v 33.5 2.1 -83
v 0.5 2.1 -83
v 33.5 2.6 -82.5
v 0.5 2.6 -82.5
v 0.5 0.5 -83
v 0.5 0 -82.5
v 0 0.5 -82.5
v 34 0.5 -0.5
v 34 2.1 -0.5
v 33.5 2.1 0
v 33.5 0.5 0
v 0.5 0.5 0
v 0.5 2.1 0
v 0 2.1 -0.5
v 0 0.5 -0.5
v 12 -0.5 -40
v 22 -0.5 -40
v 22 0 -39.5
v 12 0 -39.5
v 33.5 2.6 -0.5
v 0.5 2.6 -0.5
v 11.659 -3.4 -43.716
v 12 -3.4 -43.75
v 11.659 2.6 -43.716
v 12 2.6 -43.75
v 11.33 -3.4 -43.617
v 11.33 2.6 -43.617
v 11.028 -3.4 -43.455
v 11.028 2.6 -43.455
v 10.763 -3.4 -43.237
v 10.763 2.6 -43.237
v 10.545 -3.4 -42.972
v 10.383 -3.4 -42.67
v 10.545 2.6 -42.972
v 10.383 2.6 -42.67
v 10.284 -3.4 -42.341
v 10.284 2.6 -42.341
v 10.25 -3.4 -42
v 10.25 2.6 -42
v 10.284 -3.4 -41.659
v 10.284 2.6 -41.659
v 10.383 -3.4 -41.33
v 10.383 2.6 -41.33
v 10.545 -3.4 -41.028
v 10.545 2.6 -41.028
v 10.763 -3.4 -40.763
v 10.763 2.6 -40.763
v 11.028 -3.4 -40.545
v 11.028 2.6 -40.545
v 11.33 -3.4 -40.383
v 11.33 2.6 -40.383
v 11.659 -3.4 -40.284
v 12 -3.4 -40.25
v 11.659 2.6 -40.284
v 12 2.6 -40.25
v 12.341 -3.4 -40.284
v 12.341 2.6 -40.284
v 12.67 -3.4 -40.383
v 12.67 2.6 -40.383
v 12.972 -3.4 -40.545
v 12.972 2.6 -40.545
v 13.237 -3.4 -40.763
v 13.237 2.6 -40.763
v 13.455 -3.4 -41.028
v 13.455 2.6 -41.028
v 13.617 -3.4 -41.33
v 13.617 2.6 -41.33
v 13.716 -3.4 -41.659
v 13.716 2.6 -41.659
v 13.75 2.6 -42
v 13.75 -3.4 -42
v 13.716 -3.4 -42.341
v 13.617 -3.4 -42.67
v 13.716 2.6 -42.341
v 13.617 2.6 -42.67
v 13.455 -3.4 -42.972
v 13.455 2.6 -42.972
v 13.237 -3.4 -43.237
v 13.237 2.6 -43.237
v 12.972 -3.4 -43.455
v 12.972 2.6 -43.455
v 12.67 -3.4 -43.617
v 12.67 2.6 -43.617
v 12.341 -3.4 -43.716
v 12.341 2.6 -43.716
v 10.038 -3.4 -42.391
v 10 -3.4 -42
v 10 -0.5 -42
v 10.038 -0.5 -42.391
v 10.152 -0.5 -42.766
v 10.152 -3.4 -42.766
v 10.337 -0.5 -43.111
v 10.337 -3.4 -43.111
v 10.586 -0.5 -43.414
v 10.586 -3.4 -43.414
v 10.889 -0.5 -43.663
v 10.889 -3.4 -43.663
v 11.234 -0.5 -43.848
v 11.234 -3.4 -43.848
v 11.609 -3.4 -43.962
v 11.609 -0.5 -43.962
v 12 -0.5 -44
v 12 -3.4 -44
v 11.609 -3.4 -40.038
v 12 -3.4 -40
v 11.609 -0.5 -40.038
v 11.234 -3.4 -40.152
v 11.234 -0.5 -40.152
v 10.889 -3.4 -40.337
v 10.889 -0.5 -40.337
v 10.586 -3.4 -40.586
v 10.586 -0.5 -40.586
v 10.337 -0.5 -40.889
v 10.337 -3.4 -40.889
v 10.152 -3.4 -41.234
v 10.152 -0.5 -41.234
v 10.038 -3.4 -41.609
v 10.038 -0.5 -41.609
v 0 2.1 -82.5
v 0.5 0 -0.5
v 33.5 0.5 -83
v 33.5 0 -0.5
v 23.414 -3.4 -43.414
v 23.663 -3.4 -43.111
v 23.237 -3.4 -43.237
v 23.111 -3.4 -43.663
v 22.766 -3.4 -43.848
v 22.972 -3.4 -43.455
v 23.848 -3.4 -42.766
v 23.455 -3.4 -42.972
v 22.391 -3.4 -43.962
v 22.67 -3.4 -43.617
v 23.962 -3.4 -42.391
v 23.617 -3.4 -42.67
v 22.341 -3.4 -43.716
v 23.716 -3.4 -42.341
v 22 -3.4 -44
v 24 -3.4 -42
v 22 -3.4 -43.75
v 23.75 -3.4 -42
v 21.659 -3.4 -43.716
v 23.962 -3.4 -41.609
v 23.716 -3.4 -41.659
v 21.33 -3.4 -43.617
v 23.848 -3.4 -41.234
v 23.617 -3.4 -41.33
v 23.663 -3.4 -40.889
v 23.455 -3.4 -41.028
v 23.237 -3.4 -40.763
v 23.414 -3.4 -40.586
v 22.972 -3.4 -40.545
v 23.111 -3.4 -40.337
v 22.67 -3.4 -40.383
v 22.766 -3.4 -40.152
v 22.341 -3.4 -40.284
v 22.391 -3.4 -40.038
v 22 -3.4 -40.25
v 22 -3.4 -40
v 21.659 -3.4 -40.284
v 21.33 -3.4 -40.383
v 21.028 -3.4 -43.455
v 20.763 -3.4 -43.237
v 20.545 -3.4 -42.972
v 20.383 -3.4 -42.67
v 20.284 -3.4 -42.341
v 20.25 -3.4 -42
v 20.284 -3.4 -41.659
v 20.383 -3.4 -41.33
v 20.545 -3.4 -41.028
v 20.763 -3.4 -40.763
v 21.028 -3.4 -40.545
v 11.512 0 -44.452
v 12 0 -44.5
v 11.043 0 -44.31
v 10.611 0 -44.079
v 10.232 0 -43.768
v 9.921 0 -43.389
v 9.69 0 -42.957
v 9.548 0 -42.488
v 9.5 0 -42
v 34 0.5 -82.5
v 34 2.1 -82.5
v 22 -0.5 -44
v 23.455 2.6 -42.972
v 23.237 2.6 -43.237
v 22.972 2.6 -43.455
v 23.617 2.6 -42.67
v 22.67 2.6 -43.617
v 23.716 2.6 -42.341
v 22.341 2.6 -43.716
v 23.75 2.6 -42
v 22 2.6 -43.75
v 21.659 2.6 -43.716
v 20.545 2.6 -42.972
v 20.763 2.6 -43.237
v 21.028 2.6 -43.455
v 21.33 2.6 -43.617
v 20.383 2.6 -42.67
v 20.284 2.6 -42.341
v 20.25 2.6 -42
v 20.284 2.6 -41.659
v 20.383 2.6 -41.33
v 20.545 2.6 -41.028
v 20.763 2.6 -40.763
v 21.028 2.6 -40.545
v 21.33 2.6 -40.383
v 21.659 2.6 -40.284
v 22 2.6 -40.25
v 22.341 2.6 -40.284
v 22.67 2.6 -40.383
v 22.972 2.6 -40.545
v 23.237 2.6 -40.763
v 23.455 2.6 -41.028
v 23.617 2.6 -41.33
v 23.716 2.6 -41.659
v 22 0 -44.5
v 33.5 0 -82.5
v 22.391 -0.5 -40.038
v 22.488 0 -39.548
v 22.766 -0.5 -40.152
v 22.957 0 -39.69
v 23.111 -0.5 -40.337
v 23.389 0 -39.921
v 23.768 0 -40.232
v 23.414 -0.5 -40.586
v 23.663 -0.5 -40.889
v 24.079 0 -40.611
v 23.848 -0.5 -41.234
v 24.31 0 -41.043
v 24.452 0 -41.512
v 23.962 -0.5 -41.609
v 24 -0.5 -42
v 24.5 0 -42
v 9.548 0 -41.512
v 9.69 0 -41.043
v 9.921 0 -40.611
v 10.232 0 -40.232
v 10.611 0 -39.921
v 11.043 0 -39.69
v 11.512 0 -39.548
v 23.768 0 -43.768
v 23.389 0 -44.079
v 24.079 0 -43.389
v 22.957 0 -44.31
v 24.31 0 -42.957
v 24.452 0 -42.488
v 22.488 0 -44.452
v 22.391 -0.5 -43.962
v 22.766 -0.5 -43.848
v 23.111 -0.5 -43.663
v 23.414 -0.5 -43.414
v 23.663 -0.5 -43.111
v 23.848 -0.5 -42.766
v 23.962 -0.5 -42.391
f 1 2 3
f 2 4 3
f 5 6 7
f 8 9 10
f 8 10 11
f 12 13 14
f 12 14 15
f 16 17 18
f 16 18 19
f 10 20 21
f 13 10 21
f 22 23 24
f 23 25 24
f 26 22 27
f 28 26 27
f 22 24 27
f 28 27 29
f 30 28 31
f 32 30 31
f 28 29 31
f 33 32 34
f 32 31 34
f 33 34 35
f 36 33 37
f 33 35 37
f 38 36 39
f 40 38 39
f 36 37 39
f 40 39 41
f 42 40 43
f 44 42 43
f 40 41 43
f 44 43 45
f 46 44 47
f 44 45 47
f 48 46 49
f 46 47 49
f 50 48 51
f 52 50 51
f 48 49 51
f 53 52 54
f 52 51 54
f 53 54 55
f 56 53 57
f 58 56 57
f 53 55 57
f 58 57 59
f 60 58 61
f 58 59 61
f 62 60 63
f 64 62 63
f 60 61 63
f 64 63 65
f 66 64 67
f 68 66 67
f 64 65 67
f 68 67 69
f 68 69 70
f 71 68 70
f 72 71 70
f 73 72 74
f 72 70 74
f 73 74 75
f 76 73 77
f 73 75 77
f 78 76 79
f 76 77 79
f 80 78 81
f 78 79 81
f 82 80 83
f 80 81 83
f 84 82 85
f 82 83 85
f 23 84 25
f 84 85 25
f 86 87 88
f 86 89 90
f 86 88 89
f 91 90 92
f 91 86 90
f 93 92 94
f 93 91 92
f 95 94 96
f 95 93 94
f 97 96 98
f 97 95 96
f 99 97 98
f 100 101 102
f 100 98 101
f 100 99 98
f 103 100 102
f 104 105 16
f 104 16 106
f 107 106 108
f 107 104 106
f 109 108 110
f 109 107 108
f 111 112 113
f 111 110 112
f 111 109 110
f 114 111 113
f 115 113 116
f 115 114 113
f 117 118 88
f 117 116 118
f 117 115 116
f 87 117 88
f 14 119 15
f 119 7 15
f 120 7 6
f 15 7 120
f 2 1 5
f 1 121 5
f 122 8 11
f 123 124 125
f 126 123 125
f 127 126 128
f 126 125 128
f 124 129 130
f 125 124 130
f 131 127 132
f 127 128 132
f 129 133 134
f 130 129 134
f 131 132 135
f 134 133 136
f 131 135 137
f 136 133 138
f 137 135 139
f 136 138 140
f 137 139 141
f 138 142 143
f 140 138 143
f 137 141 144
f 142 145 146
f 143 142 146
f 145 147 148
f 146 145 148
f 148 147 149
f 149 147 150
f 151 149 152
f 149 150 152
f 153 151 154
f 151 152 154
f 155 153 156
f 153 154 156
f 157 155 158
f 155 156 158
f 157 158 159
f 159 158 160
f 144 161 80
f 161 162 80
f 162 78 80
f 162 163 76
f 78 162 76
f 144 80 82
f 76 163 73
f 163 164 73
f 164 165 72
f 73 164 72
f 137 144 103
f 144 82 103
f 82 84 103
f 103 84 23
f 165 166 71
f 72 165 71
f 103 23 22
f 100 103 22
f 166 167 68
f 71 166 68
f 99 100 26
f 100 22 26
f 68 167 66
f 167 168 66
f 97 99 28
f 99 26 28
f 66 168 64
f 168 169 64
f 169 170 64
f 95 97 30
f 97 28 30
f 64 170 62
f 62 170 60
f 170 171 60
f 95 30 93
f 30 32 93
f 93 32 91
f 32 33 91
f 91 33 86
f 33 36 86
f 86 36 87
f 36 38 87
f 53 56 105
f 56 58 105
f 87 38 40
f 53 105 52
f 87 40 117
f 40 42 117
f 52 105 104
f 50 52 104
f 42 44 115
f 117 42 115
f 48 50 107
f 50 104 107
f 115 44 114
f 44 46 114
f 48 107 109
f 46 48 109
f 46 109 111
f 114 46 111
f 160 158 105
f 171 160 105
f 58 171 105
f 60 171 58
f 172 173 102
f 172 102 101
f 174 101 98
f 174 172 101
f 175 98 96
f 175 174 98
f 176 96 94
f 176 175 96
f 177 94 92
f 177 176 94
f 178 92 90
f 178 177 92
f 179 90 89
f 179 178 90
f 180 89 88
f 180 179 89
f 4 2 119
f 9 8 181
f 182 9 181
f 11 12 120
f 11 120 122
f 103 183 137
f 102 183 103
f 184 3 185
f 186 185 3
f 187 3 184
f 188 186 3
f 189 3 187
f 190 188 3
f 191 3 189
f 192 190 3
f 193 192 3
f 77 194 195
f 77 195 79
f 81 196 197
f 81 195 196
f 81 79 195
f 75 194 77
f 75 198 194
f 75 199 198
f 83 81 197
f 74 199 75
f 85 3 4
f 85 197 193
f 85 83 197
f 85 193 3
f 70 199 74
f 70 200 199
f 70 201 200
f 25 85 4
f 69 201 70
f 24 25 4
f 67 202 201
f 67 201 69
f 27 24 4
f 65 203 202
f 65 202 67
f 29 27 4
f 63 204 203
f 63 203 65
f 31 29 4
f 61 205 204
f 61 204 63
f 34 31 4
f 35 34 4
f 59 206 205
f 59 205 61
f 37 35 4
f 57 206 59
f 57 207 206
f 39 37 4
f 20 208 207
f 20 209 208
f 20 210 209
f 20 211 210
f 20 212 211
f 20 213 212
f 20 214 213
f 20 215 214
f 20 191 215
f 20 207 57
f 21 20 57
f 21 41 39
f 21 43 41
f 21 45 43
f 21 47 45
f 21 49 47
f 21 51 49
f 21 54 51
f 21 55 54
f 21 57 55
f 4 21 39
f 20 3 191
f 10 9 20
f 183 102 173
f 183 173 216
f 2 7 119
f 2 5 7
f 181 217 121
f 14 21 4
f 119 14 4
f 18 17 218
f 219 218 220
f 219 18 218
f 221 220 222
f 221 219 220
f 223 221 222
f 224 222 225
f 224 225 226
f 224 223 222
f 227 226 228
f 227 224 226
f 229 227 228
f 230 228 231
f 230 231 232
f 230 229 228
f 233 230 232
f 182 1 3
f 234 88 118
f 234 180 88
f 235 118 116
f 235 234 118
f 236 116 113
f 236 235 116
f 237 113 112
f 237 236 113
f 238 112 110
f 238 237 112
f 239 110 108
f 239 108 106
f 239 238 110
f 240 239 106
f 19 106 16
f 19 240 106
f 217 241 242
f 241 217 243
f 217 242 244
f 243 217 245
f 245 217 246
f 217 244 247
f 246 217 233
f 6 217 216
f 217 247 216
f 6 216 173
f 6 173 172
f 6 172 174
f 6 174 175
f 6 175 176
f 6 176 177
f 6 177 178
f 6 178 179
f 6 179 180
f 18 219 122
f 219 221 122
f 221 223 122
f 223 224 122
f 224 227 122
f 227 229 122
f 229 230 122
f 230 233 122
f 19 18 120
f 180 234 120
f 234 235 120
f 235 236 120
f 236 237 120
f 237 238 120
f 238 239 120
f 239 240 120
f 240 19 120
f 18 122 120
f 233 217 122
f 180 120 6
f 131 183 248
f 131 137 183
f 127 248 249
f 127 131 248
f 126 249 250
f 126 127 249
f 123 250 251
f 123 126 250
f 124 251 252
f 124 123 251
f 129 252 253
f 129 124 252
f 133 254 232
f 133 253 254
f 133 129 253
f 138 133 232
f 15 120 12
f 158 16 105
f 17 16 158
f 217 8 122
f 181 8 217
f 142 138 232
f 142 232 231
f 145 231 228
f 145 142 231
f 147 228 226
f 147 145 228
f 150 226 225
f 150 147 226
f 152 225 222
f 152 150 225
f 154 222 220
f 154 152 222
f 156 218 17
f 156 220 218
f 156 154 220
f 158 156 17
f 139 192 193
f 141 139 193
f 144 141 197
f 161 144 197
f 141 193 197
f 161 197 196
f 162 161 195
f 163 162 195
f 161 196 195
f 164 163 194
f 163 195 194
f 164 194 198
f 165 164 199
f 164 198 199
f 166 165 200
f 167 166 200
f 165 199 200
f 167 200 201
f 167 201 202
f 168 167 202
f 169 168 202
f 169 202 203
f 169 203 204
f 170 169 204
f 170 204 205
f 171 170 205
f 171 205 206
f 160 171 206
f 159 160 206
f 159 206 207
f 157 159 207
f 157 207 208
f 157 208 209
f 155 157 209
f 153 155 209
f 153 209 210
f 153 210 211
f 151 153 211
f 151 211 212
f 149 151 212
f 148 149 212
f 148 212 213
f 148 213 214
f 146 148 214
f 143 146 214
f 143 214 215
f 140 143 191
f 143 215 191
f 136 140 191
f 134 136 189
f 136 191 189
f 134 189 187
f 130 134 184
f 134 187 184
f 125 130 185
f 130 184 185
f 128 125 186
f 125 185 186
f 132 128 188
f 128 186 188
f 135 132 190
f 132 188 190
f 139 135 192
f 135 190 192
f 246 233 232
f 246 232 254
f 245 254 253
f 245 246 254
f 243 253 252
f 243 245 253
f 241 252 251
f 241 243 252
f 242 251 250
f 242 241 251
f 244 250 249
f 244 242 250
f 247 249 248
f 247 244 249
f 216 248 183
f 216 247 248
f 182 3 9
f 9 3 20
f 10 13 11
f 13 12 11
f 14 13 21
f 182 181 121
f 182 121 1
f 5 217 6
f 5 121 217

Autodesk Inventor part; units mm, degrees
ref_plane "YZ Plane" through (0, 0, 0) normal (1, 0, 0) x (0, 1, 0)
ref_plane "XZ Plane" through (0, 0, 0) normal (0, 1, 0) x (-1, 0, 0)
ref_plane "XY Plane" through (0, 0, 0) normal (0, 0, 1) x (1, 0, 0)
sketch "Sketch1" plane through (0, 0, 0) normal (0, 1, 0) x (-1, 0, 0)
  line L0 (0, 0) -> (-34, 0)
  line L1 (-34, 0) -> (-34, -83)
  line L2 (-34, -83) -> (0, -83)
  line L3 (0, -83) -> (0, 0)
  line L4 (-10, -40) -> (-24, -40)
  line L5 (-24, -40) -> (-24, -44)
  line L6 (-24, -44) -> (-10, -44)
  line L7 (-10, -44) -> (-10, -40)
  line L8 (-17, 0) -> (-17, -40) construction
  line L9 (-10, -44) -> (-14, -40) construction
  line L10 (-24, -44) -> (-20, -40) construction
  point P0 (-22, -42)
  point P1 (-12, -42)
  dimension "d0" = 34
  dimension "d1" = 83
  dimension "d2" = 14
  dimension "d3" = 4
  dimension "d4" = 43
  dimension "d12" = 45
extrude "Extrusion1" add sketch "Sketch1" along normal blind 2.6 contours L3 L2 L1 L0 | L7 L6 L5 L4
extrude "Extrusion2" add sketch "Sketch1" against normal blind 3.4 contours L7 L6 L5 L4
sketch "Sketch2" plane through (0, -3.4, 0) normal (0, -1, 0) x (1, 0, 0)
  point P0 (0, 0)
  point P1 (22, -42)
  point P2 (12, -42)
hole "Hole1" at (22, -3.4, -42) at (12, -3.4, -42) direction (0, 1, 0) diameter 3.5 depth 8
fillet "Fillet1" radius 2 4 edges at (24, -1.7, -40) (24, -1.7, -44) (10, -1.7, -40) (10, -1.7, -44)
chamfer "Chamfer1" distance 0.5 angle 45 16 edges at (34, 0, -41.5) (34, 1.3, 0) (17, 0, 0) (0, 0, -41.5) (17, 0, -83) (17, 2.6, -83) (0, 1.3, -83) (34, 1.3, -83) (0, 1.3, 0) (10.5856, 0, -40.5856) (17, 0, -44) (23.4144, 0, -40.5856) (17, 0, -40) (34, 2.6, -41.5) (17, 2.6, 0) (0, 2.6, -41.5)
properties part number "Game-Piece-Funnel-Pusher-Plate"
